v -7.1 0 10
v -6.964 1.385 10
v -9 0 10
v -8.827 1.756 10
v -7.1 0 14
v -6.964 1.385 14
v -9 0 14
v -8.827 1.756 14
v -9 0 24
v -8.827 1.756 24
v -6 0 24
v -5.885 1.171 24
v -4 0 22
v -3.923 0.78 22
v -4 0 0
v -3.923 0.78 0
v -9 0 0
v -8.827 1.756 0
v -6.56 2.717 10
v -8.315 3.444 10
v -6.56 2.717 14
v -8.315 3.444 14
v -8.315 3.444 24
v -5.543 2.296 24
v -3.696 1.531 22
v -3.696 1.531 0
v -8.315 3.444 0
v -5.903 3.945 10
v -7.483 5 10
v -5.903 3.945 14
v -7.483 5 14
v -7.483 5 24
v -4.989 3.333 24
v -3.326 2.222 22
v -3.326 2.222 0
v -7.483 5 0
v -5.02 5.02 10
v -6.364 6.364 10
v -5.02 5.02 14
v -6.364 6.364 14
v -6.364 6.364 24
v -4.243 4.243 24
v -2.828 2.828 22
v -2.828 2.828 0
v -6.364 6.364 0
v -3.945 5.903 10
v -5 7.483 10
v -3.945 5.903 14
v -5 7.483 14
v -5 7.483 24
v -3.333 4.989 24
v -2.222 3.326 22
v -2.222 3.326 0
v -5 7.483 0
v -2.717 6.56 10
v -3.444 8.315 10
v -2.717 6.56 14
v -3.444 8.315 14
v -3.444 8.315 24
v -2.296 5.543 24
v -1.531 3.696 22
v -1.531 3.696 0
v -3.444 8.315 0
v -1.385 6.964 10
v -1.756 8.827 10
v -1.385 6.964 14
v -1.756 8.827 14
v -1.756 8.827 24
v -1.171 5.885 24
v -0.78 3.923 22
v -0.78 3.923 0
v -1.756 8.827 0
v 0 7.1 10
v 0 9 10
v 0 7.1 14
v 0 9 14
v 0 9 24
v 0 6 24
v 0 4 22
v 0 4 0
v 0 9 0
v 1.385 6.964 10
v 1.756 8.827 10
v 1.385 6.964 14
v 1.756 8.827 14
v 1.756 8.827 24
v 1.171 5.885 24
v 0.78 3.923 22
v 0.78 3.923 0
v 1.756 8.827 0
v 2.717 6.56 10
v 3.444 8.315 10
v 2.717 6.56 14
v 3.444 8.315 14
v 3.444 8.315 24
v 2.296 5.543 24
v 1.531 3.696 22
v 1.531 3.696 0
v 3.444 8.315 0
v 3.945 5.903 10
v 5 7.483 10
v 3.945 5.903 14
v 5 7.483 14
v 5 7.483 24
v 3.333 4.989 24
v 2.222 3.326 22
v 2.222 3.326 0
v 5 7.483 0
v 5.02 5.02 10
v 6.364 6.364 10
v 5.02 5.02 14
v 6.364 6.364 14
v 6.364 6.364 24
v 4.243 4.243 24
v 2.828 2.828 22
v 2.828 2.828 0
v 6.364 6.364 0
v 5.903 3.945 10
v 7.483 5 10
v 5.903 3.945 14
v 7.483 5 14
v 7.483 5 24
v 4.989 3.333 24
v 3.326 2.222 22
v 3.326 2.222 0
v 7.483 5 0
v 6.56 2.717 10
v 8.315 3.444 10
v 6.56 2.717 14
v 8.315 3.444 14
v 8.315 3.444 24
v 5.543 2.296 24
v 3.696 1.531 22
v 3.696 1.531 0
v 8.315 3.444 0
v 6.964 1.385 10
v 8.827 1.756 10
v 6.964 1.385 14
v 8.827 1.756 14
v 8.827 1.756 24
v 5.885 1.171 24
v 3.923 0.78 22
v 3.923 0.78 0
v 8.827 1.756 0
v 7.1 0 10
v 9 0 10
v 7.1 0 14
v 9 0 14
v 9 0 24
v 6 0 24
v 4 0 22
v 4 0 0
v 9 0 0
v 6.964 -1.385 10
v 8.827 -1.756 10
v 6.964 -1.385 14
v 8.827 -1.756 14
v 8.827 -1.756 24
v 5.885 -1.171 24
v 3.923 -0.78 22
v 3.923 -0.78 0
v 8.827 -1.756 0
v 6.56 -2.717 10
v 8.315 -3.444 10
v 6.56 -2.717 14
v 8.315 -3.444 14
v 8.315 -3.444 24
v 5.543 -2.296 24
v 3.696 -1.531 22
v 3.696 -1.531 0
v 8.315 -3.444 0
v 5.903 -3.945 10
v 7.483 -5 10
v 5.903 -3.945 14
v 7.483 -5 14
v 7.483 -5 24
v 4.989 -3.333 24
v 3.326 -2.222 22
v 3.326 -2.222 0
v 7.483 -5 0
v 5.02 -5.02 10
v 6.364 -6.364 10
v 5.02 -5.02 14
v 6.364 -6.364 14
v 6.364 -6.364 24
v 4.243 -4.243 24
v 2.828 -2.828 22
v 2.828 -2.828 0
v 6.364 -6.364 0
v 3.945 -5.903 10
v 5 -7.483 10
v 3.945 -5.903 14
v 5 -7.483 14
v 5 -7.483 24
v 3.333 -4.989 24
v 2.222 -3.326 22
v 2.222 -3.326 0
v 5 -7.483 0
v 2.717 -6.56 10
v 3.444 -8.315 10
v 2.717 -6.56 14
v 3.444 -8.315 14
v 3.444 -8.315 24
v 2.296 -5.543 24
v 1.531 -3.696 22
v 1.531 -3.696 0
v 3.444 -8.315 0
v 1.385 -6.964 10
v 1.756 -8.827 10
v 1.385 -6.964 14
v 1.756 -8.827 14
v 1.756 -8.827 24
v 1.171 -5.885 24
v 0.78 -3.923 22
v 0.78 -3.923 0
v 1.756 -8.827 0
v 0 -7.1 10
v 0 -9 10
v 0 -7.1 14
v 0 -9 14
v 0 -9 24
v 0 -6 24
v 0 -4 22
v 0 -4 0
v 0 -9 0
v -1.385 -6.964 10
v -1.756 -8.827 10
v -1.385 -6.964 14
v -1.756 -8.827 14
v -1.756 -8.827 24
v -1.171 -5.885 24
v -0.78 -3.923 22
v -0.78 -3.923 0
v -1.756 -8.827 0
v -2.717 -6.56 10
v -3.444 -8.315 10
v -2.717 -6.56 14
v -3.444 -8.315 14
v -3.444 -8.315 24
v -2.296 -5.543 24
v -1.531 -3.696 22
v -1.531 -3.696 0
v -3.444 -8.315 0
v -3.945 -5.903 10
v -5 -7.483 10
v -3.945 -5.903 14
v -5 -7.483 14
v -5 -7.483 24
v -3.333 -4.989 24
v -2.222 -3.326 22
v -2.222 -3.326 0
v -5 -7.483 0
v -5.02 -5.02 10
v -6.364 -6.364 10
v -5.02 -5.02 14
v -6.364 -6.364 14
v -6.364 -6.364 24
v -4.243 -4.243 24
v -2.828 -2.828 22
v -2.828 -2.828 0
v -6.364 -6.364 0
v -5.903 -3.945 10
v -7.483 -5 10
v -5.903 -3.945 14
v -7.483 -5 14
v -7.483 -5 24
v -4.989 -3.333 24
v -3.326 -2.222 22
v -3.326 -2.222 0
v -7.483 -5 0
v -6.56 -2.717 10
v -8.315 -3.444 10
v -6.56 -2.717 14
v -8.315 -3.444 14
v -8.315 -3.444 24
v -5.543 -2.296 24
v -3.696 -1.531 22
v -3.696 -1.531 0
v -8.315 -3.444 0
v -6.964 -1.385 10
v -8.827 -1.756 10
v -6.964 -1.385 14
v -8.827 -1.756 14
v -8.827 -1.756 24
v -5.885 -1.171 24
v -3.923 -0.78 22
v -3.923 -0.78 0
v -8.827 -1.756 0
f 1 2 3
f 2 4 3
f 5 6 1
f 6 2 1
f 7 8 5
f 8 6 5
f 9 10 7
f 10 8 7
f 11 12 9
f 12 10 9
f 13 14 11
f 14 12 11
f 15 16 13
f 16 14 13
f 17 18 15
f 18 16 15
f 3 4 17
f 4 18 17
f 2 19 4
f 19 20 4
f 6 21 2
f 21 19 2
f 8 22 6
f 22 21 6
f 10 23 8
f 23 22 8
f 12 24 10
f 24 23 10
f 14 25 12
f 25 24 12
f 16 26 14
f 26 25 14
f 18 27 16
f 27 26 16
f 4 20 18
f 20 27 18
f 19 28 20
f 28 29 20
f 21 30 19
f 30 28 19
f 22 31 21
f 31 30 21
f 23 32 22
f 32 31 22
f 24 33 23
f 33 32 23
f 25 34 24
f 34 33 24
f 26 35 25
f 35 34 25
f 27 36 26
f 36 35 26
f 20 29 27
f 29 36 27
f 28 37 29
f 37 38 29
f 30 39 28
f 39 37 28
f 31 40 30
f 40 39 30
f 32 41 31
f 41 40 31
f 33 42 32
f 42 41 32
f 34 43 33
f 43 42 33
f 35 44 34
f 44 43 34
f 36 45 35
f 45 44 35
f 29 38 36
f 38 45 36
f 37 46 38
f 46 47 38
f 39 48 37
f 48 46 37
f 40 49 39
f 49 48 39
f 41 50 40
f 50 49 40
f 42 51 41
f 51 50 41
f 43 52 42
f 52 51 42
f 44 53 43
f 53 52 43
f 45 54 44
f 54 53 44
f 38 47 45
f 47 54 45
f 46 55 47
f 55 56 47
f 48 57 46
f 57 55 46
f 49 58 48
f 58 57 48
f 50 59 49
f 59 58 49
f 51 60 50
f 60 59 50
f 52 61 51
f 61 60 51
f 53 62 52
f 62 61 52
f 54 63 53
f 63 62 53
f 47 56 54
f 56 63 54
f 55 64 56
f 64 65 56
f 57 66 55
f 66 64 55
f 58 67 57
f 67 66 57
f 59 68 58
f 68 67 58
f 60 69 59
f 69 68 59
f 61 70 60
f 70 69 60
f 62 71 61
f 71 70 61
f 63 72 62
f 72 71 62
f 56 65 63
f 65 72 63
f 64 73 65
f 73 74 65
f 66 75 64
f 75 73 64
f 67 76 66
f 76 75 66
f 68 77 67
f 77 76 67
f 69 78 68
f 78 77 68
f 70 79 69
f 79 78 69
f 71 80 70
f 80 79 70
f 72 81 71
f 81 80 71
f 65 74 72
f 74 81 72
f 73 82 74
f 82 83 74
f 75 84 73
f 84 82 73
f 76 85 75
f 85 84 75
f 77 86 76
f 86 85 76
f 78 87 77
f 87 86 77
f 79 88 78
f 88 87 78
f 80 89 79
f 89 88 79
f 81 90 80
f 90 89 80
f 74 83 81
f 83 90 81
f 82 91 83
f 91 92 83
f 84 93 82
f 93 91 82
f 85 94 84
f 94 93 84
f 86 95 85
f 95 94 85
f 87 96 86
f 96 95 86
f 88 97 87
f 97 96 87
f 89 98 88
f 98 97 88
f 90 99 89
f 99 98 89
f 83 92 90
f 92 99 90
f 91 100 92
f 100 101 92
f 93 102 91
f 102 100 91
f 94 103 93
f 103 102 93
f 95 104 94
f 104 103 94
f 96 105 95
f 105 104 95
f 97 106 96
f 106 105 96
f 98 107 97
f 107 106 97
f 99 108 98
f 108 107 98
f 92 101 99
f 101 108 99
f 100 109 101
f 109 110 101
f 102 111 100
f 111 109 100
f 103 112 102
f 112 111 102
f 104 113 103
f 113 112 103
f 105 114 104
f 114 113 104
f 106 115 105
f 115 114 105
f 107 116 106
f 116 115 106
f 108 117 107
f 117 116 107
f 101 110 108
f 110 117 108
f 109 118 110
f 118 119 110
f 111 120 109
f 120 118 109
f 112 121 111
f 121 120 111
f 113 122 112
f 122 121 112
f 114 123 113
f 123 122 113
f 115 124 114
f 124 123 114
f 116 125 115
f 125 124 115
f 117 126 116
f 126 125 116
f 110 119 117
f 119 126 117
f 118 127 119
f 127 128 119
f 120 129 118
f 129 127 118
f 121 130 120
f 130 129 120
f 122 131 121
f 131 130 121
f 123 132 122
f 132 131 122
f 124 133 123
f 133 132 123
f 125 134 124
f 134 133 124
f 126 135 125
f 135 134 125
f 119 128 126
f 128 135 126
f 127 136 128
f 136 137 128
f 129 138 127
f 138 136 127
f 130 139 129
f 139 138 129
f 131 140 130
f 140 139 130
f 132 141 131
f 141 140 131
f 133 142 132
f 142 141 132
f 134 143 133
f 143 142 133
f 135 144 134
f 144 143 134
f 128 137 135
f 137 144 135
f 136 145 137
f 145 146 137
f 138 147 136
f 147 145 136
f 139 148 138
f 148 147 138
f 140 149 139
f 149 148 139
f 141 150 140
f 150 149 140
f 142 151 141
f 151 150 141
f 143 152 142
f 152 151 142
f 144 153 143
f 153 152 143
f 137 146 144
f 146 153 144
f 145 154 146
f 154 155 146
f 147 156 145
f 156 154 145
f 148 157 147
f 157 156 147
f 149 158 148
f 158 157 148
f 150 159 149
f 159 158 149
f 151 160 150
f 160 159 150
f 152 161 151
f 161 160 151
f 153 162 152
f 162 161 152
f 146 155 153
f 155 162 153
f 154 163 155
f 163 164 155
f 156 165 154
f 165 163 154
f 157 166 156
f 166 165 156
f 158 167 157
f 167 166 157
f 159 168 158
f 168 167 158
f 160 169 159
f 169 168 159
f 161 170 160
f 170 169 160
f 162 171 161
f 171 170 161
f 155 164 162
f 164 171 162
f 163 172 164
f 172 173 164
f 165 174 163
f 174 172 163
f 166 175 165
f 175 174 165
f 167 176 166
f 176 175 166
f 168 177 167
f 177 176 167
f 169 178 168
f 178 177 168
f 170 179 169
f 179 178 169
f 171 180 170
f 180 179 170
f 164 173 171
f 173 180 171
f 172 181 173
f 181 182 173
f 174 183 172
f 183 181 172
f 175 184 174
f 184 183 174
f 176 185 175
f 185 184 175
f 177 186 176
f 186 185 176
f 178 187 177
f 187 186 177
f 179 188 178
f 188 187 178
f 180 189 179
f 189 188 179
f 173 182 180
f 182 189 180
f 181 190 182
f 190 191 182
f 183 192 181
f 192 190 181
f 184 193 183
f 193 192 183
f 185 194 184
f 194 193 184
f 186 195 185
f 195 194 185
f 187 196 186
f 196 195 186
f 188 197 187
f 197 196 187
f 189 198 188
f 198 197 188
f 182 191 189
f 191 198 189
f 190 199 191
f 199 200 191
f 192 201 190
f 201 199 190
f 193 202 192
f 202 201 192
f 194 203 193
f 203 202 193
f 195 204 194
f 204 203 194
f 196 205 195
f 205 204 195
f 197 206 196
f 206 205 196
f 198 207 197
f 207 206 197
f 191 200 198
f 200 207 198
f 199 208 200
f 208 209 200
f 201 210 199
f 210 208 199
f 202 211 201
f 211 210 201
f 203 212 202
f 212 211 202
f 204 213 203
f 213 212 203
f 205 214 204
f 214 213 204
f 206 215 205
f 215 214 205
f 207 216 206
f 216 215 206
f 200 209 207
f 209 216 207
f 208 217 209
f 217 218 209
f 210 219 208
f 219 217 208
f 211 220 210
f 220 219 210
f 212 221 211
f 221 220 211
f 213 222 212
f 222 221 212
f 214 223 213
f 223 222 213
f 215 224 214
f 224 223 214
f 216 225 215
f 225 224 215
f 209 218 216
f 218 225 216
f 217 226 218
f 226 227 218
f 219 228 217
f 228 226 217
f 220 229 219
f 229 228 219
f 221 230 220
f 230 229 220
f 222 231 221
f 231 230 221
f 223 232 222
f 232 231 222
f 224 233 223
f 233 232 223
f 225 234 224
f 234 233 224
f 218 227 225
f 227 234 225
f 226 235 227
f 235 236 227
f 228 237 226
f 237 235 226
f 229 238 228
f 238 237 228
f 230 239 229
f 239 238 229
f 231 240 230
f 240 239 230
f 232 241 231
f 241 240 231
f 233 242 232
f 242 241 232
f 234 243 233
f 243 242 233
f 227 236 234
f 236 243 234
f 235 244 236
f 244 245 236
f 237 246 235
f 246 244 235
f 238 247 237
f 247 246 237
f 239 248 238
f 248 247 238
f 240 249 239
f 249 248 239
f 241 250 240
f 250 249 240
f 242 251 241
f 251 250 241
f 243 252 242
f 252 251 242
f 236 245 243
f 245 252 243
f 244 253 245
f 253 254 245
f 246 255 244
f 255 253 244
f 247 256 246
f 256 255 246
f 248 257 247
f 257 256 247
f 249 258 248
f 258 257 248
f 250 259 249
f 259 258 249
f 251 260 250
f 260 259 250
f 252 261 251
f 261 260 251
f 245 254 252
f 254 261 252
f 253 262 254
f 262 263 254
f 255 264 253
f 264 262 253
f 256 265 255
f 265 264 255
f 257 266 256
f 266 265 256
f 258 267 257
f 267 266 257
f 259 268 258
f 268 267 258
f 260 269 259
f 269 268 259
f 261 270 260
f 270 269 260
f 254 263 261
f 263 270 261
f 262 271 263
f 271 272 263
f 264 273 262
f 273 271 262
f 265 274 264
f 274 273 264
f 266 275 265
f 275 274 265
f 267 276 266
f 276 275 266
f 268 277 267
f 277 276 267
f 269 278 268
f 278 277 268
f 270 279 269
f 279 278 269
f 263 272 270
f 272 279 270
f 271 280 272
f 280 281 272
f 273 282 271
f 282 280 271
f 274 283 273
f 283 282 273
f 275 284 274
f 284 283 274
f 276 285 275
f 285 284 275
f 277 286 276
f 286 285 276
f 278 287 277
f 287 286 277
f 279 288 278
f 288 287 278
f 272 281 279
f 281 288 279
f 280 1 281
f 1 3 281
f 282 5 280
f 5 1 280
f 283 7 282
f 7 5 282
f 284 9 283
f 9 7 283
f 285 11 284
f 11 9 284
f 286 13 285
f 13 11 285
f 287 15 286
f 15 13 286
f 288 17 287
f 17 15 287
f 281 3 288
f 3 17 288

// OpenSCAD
$fn = 32;

// ----------------------------------------------------------------------
// Grooved revolve: thread_relief, bore R4
// ----------------------------------------------------------------------

// --- parameters (mm) ---
bore_r = 4;               // bore radius
outer_r = 9;              // outer radius of the body
total_h = 24;             // overall height, Z
wall = 5;                 // radial wall thickness
groove_w = 4;             // groove width
groove_d = 1.9;           // groove depth
grooves = 1;              // number of outer grooves
relief = 2;               // thread relief leg at the bore mouth
relief_angle = 45;        // thread relief chamfer angle, degrees

bbox_x = 2 * outer_r;  // full diameter
bore_d = 2 * bore_r;  // bore diameter
body_d = 2 * outer_r;  // body diameter
revolve_angle = 360;  // full turn around the Z axis

profile = [[4, 0], [9, 0], [9, 10], [7.1, 10], [7.1, 14], [9, 14], [9, 24], [6, 24], [4, 22]];  // primary outline, 9 points, counter clockwise

// --- the one profile operation ---
rotate_extrude(angle = revolve_angle) polygon(points = profile);
